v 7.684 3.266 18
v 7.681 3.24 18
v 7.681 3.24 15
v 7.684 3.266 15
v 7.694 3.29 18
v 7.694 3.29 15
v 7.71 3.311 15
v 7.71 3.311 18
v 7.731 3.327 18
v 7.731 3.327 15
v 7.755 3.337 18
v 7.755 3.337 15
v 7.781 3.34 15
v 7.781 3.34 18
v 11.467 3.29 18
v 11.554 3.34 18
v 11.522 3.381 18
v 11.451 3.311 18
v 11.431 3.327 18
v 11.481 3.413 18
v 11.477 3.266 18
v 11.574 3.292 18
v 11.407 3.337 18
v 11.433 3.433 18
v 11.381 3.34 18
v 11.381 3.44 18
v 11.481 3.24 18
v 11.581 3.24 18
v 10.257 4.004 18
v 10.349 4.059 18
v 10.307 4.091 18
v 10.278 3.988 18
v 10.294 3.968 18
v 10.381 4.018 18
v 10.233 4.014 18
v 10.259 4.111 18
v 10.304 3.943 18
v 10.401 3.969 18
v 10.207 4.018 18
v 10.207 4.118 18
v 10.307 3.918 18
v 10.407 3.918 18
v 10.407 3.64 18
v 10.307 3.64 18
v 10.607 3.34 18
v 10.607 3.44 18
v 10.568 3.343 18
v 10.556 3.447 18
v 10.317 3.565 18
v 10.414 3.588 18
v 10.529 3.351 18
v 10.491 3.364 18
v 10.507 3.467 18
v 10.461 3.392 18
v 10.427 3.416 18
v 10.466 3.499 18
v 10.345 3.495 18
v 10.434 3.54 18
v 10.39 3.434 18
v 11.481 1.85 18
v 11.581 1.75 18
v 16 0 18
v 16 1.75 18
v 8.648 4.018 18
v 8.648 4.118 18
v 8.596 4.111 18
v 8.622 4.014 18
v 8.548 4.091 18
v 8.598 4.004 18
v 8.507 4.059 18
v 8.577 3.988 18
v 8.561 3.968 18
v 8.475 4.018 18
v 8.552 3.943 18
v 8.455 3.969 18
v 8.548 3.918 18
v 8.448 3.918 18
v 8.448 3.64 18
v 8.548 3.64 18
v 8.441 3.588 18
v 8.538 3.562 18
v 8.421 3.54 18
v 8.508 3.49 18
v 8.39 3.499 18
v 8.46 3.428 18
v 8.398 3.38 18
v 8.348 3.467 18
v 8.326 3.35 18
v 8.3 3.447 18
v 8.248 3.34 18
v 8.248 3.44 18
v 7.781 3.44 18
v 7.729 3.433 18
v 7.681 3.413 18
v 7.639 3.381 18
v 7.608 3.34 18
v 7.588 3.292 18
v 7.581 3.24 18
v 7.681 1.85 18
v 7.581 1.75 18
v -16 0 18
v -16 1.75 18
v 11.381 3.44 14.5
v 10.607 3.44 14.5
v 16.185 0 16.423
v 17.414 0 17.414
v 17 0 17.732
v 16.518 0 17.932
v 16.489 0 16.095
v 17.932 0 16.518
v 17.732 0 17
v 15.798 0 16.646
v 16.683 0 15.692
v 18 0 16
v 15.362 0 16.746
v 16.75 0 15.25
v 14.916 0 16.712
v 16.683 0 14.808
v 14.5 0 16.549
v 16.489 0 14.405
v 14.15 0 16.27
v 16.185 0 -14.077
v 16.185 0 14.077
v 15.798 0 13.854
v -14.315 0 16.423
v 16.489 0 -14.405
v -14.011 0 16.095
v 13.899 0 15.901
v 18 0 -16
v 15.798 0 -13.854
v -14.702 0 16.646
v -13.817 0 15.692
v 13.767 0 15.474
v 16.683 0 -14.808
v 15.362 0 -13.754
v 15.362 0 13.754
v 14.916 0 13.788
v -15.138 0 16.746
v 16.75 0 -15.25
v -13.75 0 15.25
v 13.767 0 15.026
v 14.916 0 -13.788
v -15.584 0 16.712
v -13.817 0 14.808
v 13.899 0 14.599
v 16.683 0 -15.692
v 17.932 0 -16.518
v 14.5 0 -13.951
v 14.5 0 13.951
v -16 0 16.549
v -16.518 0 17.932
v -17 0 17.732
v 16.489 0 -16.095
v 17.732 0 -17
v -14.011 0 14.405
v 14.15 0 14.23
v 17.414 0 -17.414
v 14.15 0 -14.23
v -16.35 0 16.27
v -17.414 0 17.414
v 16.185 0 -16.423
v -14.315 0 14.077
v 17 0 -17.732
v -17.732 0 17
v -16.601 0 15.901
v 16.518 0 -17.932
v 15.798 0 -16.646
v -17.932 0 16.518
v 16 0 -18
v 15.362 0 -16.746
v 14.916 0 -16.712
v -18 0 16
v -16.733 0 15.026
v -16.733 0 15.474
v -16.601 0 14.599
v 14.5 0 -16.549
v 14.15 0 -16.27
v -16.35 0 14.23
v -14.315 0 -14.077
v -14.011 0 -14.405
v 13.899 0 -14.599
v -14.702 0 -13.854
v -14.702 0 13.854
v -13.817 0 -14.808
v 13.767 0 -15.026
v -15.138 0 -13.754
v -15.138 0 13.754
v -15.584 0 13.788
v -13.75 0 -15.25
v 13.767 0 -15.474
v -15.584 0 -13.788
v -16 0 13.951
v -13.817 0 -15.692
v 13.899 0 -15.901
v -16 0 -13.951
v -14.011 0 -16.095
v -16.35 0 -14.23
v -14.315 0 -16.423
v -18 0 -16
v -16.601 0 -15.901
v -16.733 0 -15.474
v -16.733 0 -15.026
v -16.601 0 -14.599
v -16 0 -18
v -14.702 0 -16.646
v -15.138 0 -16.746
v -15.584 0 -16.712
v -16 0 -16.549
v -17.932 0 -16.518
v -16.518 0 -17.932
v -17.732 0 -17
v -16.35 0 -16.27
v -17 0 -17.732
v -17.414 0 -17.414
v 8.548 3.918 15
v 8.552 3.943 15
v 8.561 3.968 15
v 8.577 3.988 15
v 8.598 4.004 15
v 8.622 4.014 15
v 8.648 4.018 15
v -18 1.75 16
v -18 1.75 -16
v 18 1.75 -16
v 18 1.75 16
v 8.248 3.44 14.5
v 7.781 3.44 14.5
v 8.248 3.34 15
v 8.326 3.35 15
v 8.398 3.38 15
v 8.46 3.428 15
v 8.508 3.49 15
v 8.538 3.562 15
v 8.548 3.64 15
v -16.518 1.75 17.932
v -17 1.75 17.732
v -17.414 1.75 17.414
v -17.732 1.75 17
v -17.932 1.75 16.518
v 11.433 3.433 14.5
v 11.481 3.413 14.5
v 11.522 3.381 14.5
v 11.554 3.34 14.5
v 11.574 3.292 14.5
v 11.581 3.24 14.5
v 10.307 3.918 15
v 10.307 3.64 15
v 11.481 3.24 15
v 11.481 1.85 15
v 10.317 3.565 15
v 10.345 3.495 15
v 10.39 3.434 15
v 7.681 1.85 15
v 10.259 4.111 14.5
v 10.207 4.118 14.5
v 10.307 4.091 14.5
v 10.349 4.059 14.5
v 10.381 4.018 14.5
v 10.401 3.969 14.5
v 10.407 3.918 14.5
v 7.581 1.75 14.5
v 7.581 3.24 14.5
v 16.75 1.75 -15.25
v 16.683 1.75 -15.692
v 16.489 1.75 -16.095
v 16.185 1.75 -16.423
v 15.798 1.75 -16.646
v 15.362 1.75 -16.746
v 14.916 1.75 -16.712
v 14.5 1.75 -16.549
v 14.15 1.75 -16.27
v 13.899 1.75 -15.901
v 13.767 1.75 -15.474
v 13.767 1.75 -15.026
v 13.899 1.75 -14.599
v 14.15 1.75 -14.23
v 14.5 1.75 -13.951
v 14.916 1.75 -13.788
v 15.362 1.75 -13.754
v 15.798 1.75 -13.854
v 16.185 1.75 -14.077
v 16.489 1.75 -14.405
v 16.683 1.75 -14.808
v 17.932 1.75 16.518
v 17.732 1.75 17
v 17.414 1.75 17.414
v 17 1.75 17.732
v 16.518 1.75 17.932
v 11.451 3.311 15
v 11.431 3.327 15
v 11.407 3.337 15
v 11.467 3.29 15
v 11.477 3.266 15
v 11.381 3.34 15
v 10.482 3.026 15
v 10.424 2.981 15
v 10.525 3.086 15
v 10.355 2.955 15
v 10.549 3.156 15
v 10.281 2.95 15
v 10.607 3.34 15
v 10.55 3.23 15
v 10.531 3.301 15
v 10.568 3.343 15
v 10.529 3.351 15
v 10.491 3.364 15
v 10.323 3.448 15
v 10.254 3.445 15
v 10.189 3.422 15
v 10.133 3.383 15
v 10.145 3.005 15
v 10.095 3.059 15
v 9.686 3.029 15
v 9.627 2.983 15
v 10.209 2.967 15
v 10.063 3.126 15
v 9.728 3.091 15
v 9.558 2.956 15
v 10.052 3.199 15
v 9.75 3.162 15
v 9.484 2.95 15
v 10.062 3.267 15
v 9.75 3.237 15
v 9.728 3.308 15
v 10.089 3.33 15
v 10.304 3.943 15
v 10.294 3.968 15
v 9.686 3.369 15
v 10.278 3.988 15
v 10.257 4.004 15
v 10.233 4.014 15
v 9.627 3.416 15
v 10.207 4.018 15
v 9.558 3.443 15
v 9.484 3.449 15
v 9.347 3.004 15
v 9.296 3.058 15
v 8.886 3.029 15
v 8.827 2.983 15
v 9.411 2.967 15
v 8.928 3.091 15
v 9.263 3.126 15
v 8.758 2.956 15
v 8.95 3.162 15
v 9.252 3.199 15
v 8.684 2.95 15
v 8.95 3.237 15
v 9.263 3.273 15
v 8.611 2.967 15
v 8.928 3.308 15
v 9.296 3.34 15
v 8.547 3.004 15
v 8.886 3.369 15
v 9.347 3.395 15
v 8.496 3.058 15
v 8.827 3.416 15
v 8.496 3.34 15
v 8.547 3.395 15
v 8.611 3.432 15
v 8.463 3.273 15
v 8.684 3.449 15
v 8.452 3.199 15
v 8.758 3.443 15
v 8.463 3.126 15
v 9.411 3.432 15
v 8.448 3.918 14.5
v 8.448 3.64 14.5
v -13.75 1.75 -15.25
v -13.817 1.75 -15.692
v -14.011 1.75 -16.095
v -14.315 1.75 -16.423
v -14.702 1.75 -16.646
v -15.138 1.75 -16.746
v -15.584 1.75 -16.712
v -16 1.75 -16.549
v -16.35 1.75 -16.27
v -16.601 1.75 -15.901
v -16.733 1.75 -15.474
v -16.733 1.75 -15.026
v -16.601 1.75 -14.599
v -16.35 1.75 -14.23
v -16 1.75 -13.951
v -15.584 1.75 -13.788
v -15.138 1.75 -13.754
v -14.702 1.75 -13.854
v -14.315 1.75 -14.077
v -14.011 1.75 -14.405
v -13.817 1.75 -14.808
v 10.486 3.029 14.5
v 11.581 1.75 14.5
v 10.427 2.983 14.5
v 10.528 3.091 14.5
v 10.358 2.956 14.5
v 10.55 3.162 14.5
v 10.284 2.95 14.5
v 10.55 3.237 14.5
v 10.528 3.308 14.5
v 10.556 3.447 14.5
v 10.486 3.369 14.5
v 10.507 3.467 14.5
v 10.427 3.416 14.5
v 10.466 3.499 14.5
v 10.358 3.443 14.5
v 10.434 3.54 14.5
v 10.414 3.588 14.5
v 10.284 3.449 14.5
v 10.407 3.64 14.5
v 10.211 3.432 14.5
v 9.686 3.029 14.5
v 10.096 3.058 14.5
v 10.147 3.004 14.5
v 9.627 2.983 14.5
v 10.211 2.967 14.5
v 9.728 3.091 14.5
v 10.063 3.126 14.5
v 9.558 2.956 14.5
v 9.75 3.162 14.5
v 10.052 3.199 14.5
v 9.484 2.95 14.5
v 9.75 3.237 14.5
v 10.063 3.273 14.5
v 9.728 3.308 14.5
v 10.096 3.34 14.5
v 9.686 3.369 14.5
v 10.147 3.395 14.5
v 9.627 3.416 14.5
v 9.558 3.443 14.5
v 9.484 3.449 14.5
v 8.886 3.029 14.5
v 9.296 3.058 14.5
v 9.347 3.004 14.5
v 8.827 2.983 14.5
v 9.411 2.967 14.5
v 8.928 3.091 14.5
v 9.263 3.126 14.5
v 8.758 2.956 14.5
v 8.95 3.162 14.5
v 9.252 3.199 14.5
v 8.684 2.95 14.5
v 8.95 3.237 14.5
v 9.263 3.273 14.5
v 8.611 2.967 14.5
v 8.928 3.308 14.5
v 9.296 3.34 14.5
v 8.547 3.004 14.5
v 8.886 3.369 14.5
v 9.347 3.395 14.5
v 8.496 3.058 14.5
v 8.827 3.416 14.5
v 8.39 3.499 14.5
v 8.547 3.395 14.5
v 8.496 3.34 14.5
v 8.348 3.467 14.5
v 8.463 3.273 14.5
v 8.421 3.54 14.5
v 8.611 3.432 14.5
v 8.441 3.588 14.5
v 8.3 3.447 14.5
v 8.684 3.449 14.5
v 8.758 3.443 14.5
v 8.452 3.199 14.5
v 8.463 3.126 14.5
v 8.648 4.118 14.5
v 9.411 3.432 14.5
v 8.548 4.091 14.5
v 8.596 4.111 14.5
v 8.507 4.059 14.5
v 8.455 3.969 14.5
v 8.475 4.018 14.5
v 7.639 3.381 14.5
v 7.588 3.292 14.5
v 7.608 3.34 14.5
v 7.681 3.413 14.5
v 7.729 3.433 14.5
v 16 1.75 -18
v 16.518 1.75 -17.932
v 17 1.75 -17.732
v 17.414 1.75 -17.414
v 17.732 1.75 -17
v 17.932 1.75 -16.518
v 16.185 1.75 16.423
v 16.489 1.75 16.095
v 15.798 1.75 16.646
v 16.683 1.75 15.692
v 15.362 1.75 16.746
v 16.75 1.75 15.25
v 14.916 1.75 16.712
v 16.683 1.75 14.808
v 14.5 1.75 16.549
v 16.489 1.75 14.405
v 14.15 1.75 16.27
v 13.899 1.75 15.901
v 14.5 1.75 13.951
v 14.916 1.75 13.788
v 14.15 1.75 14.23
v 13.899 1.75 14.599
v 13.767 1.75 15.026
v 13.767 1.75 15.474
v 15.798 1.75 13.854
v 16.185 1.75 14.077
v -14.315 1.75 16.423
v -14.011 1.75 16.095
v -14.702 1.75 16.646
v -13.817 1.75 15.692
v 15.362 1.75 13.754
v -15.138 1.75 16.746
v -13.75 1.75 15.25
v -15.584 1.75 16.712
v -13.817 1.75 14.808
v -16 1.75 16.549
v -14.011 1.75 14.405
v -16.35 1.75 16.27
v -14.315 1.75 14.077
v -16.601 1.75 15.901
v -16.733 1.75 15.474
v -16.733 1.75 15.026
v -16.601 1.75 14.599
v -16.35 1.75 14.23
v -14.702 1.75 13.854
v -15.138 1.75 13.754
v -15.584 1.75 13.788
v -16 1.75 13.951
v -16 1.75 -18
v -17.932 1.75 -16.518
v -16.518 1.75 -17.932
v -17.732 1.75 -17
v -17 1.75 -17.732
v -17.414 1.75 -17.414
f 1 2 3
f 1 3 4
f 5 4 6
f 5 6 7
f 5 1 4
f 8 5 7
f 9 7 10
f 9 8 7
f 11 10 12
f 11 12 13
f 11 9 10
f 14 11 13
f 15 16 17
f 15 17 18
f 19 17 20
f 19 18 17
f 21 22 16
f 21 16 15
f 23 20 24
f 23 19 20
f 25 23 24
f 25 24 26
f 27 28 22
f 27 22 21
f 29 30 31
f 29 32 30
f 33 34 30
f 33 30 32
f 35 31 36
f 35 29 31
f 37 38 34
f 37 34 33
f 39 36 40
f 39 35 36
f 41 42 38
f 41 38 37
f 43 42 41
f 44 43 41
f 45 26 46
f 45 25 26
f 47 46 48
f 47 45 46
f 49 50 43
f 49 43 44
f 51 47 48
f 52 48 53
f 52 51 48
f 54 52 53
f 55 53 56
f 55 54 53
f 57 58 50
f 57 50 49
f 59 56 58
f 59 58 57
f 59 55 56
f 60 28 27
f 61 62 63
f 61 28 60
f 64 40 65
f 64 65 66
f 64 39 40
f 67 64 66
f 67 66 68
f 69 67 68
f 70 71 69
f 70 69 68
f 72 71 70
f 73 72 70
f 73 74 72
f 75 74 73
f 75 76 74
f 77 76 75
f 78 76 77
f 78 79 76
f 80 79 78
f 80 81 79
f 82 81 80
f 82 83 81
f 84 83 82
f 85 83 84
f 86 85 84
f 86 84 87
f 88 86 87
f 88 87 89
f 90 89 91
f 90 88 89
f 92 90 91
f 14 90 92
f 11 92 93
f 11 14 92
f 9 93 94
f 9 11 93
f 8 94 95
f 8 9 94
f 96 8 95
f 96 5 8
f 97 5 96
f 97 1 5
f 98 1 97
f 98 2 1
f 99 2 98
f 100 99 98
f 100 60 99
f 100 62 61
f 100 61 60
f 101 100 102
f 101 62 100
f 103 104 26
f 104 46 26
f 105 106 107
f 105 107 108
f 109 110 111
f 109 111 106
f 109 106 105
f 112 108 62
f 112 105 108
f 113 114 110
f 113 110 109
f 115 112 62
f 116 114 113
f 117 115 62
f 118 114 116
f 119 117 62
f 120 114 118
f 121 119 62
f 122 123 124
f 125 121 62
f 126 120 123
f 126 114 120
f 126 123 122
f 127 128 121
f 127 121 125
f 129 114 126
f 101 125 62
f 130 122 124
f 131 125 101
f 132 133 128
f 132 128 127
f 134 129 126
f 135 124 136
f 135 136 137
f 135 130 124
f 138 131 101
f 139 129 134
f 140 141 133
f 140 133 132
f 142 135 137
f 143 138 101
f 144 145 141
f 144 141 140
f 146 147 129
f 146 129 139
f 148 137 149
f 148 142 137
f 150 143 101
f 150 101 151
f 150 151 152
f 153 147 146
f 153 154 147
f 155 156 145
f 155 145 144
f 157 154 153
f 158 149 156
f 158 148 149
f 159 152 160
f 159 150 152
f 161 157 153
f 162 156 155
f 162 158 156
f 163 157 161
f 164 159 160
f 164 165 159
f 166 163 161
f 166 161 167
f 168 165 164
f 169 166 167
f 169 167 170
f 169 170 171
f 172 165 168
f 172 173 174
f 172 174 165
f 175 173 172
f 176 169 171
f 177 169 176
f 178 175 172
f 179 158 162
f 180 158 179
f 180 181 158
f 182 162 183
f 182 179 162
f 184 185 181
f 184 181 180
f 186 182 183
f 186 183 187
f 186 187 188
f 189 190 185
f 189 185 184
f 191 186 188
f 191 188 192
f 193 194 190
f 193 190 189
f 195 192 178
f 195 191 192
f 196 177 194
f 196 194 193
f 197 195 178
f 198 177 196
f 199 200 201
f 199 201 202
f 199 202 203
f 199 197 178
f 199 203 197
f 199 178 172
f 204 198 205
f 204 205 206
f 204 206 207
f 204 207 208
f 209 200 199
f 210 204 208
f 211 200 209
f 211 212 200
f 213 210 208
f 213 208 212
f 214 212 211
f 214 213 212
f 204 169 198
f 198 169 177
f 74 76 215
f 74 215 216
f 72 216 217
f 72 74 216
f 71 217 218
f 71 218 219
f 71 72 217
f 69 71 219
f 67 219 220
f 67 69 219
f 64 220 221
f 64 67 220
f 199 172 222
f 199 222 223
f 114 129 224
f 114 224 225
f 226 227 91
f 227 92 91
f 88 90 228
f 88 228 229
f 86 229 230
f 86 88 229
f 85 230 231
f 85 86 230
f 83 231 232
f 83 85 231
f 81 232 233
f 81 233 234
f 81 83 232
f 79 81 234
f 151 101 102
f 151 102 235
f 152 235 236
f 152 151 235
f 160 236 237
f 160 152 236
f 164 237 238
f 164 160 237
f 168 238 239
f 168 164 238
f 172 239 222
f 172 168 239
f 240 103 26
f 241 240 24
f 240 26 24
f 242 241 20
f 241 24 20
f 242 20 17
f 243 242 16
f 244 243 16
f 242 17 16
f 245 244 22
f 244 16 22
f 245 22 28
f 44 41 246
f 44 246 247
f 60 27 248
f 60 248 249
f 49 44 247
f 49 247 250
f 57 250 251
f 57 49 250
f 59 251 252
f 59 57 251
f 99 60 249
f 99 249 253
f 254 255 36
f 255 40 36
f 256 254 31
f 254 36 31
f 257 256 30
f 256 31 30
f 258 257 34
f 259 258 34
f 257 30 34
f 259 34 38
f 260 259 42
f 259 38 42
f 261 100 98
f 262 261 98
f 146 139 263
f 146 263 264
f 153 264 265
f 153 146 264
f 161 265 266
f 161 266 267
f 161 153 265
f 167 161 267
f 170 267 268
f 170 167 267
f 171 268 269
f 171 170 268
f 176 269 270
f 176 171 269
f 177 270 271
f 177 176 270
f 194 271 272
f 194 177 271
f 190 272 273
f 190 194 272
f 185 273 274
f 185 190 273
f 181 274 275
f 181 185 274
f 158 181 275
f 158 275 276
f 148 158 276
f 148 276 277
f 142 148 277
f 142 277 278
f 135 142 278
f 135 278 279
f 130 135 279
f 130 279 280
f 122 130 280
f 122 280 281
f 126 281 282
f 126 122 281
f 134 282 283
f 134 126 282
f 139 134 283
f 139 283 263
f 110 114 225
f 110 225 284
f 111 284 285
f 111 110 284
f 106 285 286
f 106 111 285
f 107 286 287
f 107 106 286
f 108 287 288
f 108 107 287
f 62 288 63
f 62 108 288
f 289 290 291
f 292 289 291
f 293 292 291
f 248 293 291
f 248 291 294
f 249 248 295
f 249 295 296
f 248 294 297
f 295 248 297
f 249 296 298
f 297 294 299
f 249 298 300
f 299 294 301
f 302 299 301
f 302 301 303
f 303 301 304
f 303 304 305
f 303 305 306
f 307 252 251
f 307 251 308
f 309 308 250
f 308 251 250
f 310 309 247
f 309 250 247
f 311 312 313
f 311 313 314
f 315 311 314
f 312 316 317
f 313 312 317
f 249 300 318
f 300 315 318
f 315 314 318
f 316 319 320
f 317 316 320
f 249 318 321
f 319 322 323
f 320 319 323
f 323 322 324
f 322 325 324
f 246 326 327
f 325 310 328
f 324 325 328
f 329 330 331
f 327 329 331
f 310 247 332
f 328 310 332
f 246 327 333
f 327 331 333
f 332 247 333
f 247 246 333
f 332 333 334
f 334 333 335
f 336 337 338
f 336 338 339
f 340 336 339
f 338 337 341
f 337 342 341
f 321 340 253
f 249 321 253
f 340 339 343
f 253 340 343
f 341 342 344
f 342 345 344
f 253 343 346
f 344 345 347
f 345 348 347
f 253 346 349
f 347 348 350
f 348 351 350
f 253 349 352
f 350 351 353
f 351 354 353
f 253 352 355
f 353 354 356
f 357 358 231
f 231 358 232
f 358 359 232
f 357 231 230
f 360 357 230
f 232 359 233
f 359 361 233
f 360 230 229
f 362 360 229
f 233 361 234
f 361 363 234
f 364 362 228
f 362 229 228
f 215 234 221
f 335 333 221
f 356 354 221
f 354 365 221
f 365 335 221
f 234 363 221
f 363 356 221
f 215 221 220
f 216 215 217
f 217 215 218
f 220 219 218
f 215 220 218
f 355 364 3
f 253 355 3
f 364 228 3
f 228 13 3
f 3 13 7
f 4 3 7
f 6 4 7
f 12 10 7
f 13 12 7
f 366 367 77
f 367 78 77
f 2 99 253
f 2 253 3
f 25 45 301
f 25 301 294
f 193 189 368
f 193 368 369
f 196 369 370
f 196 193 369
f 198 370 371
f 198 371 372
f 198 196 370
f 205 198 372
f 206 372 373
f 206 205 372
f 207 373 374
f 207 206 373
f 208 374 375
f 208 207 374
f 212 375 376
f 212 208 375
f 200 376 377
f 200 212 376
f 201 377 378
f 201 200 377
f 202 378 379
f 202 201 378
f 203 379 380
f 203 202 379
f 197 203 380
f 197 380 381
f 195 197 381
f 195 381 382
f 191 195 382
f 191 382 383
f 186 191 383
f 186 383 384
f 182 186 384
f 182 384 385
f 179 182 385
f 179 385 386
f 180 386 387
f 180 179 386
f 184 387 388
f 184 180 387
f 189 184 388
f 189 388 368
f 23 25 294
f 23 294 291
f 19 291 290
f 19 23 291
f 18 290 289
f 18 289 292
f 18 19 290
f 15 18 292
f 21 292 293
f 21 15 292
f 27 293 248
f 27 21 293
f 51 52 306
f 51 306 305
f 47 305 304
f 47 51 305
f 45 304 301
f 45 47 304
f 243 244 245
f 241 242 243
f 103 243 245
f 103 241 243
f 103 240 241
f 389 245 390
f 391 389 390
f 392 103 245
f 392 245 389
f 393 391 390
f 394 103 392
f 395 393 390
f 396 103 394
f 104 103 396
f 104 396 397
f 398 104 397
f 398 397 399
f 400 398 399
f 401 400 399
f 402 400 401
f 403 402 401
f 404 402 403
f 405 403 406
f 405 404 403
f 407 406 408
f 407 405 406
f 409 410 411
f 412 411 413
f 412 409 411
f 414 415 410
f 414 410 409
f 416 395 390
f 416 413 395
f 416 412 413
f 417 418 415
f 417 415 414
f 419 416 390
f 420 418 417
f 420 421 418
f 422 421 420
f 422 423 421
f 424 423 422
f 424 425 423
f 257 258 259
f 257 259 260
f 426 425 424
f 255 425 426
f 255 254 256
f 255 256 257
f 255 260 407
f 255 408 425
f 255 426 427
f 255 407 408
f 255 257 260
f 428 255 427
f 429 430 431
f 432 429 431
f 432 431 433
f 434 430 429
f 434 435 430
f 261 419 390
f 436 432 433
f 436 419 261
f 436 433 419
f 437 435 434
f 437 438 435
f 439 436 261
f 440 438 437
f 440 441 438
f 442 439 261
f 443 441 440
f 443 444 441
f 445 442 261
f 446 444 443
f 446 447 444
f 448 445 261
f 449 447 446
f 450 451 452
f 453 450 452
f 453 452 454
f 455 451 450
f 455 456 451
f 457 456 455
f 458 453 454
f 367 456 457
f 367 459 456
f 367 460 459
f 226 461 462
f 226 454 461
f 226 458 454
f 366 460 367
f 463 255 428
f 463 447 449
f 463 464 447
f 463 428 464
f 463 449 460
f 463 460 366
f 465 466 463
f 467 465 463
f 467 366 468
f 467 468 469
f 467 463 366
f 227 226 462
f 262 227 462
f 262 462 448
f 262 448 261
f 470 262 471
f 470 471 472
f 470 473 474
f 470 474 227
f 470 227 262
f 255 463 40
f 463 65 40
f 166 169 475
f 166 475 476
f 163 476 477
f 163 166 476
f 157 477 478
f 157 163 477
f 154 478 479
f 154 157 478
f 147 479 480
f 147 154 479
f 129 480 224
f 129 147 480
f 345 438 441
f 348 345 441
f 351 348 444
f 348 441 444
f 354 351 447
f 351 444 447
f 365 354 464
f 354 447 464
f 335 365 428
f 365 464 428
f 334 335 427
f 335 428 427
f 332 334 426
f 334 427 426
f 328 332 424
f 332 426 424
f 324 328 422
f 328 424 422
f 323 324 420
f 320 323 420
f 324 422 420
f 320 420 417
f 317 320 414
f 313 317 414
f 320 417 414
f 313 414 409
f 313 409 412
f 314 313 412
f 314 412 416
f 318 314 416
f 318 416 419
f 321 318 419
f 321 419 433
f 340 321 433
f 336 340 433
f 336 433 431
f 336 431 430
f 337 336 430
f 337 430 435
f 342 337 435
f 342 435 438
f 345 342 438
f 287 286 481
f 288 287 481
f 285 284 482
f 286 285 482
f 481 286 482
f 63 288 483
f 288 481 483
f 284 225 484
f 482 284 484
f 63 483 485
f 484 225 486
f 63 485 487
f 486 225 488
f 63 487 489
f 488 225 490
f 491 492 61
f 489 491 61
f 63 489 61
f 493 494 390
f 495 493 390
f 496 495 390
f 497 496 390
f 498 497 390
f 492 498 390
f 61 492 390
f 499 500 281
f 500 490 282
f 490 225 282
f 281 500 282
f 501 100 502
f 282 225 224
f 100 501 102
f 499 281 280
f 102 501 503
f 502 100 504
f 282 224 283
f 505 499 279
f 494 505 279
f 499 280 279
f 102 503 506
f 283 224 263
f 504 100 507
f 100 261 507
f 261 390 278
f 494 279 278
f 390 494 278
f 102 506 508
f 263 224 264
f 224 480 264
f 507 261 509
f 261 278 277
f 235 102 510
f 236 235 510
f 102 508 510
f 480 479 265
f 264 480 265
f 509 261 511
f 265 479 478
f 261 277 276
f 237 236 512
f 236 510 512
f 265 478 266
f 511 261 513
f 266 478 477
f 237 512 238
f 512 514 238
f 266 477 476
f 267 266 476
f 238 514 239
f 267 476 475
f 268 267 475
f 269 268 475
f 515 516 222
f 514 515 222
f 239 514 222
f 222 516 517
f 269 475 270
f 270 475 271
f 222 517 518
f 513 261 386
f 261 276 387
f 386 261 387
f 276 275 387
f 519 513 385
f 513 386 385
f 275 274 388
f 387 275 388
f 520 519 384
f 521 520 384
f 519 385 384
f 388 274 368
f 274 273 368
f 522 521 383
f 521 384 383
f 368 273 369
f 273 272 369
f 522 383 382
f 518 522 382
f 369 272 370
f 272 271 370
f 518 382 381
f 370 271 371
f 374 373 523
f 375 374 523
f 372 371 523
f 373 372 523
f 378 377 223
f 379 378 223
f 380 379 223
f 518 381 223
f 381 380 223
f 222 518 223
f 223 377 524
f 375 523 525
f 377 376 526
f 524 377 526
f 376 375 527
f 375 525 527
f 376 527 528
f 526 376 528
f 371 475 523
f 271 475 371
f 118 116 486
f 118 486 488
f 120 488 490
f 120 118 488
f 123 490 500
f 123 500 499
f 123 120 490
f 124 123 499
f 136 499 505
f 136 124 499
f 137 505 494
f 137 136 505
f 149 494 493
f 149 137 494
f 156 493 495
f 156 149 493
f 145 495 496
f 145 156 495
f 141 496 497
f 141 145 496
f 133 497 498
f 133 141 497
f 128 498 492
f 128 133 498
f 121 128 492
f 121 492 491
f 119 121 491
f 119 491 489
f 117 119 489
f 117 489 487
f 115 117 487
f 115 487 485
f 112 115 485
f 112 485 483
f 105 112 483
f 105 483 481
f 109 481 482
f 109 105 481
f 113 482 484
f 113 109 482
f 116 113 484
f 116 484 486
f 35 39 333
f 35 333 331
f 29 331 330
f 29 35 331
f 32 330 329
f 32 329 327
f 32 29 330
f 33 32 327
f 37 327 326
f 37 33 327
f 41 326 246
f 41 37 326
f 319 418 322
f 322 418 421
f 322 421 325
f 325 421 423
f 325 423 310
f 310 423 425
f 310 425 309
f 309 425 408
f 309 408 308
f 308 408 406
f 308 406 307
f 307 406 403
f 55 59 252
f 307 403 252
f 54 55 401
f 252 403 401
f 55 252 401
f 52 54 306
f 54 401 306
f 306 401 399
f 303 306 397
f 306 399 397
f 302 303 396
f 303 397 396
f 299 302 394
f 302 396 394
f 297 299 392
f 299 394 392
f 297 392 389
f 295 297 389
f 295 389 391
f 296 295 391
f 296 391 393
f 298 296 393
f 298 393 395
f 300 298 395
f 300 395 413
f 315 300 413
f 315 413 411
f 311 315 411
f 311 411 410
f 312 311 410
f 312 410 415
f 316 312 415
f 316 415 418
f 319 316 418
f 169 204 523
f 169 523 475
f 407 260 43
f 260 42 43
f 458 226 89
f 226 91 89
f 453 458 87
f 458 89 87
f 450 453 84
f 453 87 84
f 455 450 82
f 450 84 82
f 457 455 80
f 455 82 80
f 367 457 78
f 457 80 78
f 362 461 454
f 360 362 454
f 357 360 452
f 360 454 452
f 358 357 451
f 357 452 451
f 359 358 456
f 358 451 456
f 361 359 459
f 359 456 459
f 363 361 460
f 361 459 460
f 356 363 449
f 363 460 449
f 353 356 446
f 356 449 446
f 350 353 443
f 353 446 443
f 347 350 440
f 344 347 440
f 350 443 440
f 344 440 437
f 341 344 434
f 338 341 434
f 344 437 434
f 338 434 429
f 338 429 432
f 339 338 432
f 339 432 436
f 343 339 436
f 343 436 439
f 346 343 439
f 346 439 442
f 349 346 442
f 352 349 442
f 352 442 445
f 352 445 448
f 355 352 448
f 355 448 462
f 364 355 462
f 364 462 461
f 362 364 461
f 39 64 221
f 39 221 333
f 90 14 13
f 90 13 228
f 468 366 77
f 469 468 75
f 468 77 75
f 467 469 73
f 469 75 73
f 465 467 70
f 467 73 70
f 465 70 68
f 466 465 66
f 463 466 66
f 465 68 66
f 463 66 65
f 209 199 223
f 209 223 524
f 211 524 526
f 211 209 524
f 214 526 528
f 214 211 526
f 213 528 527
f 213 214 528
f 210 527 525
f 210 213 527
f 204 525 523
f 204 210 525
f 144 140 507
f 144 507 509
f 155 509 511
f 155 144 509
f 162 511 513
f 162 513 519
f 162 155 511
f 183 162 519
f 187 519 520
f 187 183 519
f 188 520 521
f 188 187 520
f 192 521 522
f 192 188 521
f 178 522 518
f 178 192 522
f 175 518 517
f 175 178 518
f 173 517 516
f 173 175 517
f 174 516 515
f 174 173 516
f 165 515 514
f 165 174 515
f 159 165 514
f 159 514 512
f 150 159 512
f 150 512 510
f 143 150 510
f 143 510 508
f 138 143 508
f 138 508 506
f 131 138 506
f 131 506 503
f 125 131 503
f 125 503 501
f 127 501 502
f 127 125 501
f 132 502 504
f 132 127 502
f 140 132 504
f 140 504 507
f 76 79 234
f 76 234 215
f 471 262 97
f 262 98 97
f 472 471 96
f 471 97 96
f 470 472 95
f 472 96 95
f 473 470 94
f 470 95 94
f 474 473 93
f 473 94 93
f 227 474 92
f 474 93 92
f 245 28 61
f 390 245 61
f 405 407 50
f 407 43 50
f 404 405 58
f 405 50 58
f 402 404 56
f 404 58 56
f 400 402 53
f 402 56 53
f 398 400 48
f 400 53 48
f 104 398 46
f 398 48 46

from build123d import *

# Parameters (mm, degrees)
SKETCH1_R           = 1.5
BOSS_EXTRUDE1_DEPTH = 1.75
BOSS_EXTRUDE4_DEPTH = 3
BOSS_EXTRUDE5_DEPTH = 0.5
CUT_EXTRUDE1_REACH  = 5.5
SKETCH7_R           = 0.25


with BuildPart() as part:
    # Sketch1 → Boss-Extrude1 (new body)
    with BuildSketch(Plane(origin=(0, 0, 0), x_dir=(1, 0, 0), z_dir=(0, 1, 0))):
        with BuildLine():
            Line((-16, 18), (16, 18))
            ThreePointArc((16, 18), (17.414213562, 17.414213562), (18, 16))
            Line((18, 16), (18, -16))
            ThreePointArc((18, -16), (17.414213562, -17.414213562), (16, -18))
            Line((16, -18), (-16, -18))
            ThreePointArc((-16, -18), (-17.414213562, -17.414213562), (-18, -16))
            Line((-18, -16), (-18, 16))
            ThreePointArc((-18, 16), (-17.414213562, 17.414213562), (-16, 18))
        make_face()
        with Locations((-15.25, 15.25)):
            Circle(SKETCH1_R, mode=Mode.SUBTRACT)
        with Locations((15.25, 15.25)):
            Circle(SKETCH1_R, mode=Mode.SUBTRACT)
        with Locations((15.25, -15.25)):
            Circle(SKETCH1_R, mode=Mode.SUBTRACT)
        with Locations((-15.25, -15.25)):
            Circle(SKETCH1_R, mode=Mode.SUBTRACT)
    extrude(amount=BOSS_EXTRUDE1_DEPTH)

    # Sketch2 → Boss-Extrude4 (add)
    with BuildSketch(Plane.XY.offset(18)):
        with BuildLine():
            Line((7.580760647, 1.75), (11.580760647, 1.75))
            Line((11.580760647, 1.75), (11.580760647, 3.240036049))
            ThreePointArc((11.580760647, 3.240036049), (11.522182003, 3.381457405), (11.380760647, 3.440036049))
            Line((11.380760647, 3.440036049), (10.607400333, 3.440036049))
            ThreePointArc((10.607400333, 3.440036049), (10.465978977, 3.498614693), (10.407400333, 3.640036049))
            Line((10.407400333, 3.640036049), (10.407400333, 3.917594602))
            ThreePointArc((10.407400333, 3.917594602), (10.348821689, 4.059015958), (10.207400333, 4.117594602))
            Line((10.207400333, 4.117594602), (8.648098096, 4.117594602))
            ThreePointArc((8.648098096, 4.117594602), (8.50667674, 4.059015958), (8.448098096, 3.917594602))
            Line((8.448098096, 3.917594602), (8.448098096, 3.640036049))
            ThreePointArc((8.448098096, 3.640036049), (8.389519452, 3.498614693), (8.248098096, 3.440036049))
            Line((8.248098096, 3.440036049), (7.780760647, 3.440036049))
            ThreePointArc((7.780760647, 3.440036049), (7.63933929, 3.381457405), (7.580760647, 3.240036049))
            Line((7.580760647, 3.240036049), (7.580760647, 1.75))
        make_face()
        with BuildLine():
            Line((8.648098096, 4.017594602), (10.207400333, 4.017594602))
            ThreePointArc((10.207400333, 4.017594602), (10.278111011, 3.98830528), (10.307400333, 3.917594602))
            Line((10.307400333, 3.917594602), (10.307400333, 3.640036049))
            ThreePointArc((10.307400333, 3.640036049), (10.395268299, 3.427904014), (10.607400333, 3.340036049))
            Line((10.607400333, 3.340036049), (11.380760647, 3.340036049))
            ThreePointArc((11.380760647, 3.340036049), (11.451471325, 3.310746727), (11.480760647, 3.240036049))
            Line((11.480760647, 3.240036049), (11.480760647, 1.85))
            Line((11.480760647, 1.85), (7.680760647, 1.85))
            Line((7.680760647, 1.85), (7.680760647, 3.240036049))
            ThreePointArc((7.680760647, 3.240036049), (7.710049968, 3.310746727), (7.780760647, 3.340036049))
            Line((7.780760647, 3.340036049), (8.248098096, 3.340036049))
            ThreePointArc((8.248098096, 3.340036049), (8.460230131, 3.427904014), (8.548098096, 3.640036049))
            Line((8.548098096, 3.640036049), (8.548098096, 3.917594602))
            ThreePointArc((8.548098096, 3.917594602), (8.577387418, 3.98830528), (8.648098096, 4.017594602))
        make_face(mode=Mode.SUBTRACT)
    extrude(amount=-BOSS_EXTRUDE4_DEPTH)

    # Sketch5 → Boss-Extrude5 (add)
    with BuildSketch(Plane(origin=(0, 0, 15), x_dir=(-1, 0, 0), z_dir=(0, 0, -1))):
        with BuildLine():
            Line((-7.580760647, 1.75), (-7.580760647, 3.240036049))
            ThreePointArc((-7.580760647, 3.240036049), (-7.63933929, 3.381457405), (-7.780760647, 3.440036049))
            Line((-7.780760647, 3.440036049), (-8.248098096, 3.440036049))
            ThreePointArc((-8.248098096, 3.440036049), (-8.389519452, 3.498614693), (-8.448098096, 3.640036049))
            Line((-8.448098096, 3.640036049), (-8.448098096, 3.917594602))
            ThreePointArc((-8.448098096, 3.917594602), (-8.50667674, 4.059015958), (-8.648098096, 4.117594602))
            Line((-8.648098096, 4.117594602), (-10.207400333, 4.117594602))
            ThreePointArc((-10.207400333, 4.117594602), (-10.348821689, 4.059015958), (-10.407400333, 3.917594602))
            Line((-10.407400333, 3.917594602), (-10.407400333, 3.640036049))
            ThreePointArc((-10.407400333, 3.640036049), (-10.465978977, 3.498614693), (-10.607400333, 3.440036049))
            Line((-10.607400333, 3.440036049), (-11.380760647, 3.440036049))
            ThreePointArc((-11.380760647, 3.440036049), (-11.522182003, 3.381457405), (-11.580760647, 3.240036049))
            Line((-11.580760647, 3.240036049), (-11.580760647, 1.75))
            Line((-11.580760647, 1.75), (-7.580760647, 1.75))
        make_face()
    extrude(amount=BOSS_EXTRUDE5_DEPTH)

    # Sketch7 → Cut-Extrude1 (cut, up to next)
    with BuildSketch(Plane(origin=(0, 0, 14.5), x_dir=(-1, 0, 0), z_dir=(0, 0, -1)), mode=Mode.PRIVATE) as cut_extrude1_sk1:
        with Locations((-10.302378592, 3.199328245)):
            Circle(SKETCH7_R)
    cut_extrude1_tool1 = extrude(cut_extrude1_sk1.sketch, amount=-CUT_EXTRUDE1_REACH, mode=Mode.PRIVATE) & part.part
    add(cut_extrude1_tool1.solids().sort_by_distance((10.302379, 3.199328, 14.5))[0], mode=Mode.SUBTRACT)
    # Sketch7 → Cut-Extrude1 (cut, up to next)
    with BuildSketch(Plane(origin=(0, 0, 14.5), x_dir=(-1, 0, 0), z_dir=(0, 0, -1)), mode=Mode.PRIVATE) as cut_extrude1_sk2:
        with Locations((-9.502378592, 3.199328245)):
            Circle(SKETCH7_R)
    cut_extrude1_tool2 = extrude(cut_extrude1_sk2.sketch, amount=-CUT_EXTRUDE1_REACH, mode=Mode.PRIVATE) & part.part
    add(cut_extrude1_tool2.solids().sort_by_distance((9.502379, 3.199328, 14.5))[0], mode=Mode.SUBTRACT)
    # Sketch7 → Cut-Extrude1 (cut, up to next)
    with BuildSketch(Plane(origin=(0, 0, 14.5), x_dir=(-1, 0, 0), z_dir=(0, 0, -1)), mode=Mode.PRIVATE) as cut_extrude1_sk3:
        with Locations((-8.702378592, 3.199328245)):
            Circle(SKETCH7_R)
    cut_extrude1_tool3 = extrude(cut_extrude1_sk3.sketch, amount=-CUT_EXTRUDE1_REACH, mode=Mode.PRIVATE) & part.part
    add(cut_extrude1_tool3.solids().sort_by_distance((8.702379, 3.199328, 14.5))[0], mode=Mode.SUBTRACT)


solid = part.part
